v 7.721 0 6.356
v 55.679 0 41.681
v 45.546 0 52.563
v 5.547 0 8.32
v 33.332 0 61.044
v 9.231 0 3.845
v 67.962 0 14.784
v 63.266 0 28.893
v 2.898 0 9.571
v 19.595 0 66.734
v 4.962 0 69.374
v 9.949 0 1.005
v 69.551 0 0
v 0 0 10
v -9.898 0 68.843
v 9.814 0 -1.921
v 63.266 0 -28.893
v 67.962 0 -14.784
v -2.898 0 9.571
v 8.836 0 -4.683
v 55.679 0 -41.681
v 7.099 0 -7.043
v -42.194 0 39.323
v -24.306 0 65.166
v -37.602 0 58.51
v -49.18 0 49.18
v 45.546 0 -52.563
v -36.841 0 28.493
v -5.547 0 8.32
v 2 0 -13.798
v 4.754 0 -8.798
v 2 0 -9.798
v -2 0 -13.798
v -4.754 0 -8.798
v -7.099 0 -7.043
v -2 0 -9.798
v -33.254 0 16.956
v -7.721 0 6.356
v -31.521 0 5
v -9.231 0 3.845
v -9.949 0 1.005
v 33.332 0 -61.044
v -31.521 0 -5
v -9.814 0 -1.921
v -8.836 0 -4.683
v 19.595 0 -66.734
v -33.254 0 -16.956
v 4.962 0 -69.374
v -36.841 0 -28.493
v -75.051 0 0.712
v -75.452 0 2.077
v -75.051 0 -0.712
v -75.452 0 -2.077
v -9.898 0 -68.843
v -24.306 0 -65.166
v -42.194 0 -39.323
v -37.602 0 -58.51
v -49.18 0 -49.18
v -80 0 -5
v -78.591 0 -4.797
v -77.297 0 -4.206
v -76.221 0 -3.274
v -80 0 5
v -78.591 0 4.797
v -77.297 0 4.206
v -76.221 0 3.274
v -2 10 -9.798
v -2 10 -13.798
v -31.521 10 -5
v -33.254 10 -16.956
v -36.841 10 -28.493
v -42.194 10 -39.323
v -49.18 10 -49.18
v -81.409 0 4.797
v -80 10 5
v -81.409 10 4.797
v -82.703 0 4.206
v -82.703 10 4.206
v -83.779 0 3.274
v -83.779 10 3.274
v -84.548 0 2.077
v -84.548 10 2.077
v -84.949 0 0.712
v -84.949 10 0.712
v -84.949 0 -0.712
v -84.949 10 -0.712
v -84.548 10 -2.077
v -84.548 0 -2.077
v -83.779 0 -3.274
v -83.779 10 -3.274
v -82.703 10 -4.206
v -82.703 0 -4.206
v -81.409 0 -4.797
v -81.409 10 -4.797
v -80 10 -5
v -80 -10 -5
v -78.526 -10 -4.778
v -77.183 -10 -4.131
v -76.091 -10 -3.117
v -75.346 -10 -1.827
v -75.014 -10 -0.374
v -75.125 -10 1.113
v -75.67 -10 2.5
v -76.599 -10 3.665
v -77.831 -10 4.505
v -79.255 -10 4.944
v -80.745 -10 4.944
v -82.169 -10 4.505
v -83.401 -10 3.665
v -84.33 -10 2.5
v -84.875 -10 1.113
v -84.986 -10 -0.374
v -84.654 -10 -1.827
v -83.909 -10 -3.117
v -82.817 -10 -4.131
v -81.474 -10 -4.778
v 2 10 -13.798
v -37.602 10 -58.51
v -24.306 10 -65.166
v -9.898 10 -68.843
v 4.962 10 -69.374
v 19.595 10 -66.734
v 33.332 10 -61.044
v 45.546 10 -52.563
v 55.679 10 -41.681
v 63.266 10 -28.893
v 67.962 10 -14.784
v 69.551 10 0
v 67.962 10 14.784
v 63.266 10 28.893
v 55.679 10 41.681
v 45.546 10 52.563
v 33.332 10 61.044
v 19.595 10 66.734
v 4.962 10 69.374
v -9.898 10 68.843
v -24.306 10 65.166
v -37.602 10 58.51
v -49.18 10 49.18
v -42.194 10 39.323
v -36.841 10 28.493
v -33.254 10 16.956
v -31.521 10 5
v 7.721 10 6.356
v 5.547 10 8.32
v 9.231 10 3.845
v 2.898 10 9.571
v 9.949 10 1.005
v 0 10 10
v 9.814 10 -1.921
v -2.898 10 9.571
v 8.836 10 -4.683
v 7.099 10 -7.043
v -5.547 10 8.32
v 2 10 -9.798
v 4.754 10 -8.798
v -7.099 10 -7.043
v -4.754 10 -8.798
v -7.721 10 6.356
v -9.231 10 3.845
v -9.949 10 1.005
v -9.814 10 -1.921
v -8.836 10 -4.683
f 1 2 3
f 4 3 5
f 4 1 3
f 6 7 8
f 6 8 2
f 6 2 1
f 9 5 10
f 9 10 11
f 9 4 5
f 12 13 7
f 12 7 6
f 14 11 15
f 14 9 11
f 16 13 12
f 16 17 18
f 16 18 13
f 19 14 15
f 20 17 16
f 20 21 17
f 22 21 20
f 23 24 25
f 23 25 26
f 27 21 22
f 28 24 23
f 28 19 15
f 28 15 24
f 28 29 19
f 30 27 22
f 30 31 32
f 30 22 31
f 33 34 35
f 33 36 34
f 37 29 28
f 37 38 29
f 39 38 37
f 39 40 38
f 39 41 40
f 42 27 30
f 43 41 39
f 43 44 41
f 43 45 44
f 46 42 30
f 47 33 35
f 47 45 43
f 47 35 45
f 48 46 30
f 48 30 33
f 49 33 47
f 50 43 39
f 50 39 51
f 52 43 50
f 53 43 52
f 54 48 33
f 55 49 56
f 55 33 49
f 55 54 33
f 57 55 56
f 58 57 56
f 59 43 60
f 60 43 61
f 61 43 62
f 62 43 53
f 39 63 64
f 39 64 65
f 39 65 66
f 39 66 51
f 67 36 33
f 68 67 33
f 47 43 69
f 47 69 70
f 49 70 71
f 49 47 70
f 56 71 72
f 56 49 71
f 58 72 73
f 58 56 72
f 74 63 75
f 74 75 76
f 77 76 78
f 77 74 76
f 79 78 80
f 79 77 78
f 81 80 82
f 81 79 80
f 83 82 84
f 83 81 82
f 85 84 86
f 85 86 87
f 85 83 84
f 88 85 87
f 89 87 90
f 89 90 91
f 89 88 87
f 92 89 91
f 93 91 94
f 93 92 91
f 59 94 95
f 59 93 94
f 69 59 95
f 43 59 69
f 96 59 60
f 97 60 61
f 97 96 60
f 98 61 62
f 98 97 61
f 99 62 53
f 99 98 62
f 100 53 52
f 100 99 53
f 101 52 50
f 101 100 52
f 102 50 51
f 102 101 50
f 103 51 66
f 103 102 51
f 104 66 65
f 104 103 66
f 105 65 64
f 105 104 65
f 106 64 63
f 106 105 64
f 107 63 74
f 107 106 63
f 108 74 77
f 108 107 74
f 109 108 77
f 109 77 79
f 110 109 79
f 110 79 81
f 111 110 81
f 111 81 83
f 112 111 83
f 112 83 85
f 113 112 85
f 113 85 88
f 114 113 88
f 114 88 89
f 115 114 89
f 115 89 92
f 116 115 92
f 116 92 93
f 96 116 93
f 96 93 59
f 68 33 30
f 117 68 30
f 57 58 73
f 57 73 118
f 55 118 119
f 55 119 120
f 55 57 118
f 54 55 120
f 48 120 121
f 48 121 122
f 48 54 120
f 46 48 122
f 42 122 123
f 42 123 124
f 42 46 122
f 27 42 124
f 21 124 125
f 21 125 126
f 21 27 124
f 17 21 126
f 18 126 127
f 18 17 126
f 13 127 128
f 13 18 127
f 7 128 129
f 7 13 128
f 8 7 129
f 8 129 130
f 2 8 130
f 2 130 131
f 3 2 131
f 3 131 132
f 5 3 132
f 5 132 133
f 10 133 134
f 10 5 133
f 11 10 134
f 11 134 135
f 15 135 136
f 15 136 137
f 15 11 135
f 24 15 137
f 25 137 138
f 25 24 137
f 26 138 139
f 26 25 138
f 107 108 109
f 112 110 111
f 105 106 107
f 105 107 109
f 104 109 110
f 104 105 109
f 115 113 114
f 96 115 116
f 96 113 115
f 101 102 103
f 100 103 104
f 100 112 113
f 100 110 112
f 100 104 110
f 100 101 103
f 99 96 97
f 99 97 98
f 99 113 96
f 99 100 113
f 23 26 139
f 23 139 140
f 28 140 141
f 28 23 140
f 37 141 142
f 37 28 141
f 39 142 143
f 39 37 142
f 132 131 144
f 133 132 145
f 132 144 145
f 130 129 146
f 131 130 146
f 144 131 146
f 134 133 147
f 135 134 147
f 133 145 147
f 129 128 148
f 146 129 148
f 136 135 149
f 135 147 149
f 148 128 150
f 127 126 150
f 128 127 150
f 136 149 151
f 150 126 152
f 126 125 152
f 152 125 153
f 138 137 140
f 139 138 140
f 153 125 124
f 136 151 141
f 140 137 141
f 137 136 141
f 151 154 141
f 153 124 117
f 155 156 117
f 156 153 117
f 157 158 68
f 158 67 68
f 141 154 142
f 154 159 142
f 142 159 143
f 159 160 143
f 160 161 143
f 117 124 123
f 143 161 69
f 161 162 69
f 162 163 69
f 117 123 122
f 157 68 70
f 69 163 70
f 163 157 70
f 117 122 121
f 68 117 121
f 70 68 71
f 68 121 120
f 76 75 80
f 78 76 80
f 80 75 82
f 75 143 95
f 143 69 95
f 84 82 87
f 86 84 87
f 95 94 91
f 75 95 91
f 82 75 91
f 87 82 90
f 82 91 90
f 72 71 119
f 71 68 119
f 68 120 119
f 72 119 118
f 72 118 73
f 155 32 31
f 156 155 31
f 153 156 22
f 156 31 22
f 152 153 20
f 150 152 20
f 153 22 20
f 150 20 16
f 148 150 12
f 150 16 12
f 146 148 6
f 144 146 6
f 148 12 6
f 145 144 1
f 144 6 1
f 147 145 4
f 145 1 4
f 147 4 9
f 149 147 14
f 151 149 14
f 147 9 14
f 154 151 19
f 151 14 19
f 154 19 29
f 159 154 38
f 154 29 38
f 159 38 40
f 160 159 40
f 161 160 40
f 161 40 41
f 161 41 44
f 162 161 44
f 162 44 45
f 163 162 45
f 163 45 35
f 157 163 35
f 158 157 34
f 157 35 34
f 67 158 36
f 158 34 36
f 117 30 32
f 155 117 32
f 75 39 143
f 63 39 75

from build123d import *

# Parameters (mm, degrees)
EXTRUDE_1_DEPTH = 10
EXTRUDE_START   = 10
SKETCH_2_R      = 5
EXTRUDE_2_DEPTH = 10


with BuildPart() as part:
    # 草图1 → 凸台-拉伸1 (new body)
    with BuildSketch(Plane(origin=(0, 0, 0), x_dir=(1, 0, 0), z_dir=(0, 1, 0))):
        with BuildLine():
            Line((-80, 5), (-31.520674237, 5))
            ThreePointArc((-31.520674237, 5), (-36.841255051, 28.492771834), (-49.180194883, 49.180194883))
            ThreePointArc((-49.180194883, 49.180194883), (69.551298604, 0), (-49.180194883, -49.180194883))
            ThreePointArc((-49.180194883, -49.180194883), (-36.841255051, -28.492771834), (-31.520674237, -5))
            Line((-31.520674237, -5), (-80, -5))
            ThreePointArc((-80, -5), (-85, 0), (-80, 5))
        make_face()
        with BuildLine():
            Line((-2, 9.797958971), (-2, 13.797958971))
            Line((-2, 13.797958971), (2, 13.797958971))
            Line((2, 13.797958971), (2, 9.797958971))
            ThreePointArc((2, 9.797958971), (0, -10), (-2, 9.797958971))
        make_face(mode=Mode.SUBTRACT)
    extrude(amount=EXTRUDE_1_DEPTH)

    # 草图2 → 凸台-拉伸2 (add)
    with BuildSketch(Plane.XZ.offset(EXTRUDE_START)):
        with Locations(Location((-80, 0, 0), (0, 0, 270))):
            Circle(SKETCH_2_R)
    extrude(amount=-EXTRUDE_2_DEPTH)


solid = part.part
